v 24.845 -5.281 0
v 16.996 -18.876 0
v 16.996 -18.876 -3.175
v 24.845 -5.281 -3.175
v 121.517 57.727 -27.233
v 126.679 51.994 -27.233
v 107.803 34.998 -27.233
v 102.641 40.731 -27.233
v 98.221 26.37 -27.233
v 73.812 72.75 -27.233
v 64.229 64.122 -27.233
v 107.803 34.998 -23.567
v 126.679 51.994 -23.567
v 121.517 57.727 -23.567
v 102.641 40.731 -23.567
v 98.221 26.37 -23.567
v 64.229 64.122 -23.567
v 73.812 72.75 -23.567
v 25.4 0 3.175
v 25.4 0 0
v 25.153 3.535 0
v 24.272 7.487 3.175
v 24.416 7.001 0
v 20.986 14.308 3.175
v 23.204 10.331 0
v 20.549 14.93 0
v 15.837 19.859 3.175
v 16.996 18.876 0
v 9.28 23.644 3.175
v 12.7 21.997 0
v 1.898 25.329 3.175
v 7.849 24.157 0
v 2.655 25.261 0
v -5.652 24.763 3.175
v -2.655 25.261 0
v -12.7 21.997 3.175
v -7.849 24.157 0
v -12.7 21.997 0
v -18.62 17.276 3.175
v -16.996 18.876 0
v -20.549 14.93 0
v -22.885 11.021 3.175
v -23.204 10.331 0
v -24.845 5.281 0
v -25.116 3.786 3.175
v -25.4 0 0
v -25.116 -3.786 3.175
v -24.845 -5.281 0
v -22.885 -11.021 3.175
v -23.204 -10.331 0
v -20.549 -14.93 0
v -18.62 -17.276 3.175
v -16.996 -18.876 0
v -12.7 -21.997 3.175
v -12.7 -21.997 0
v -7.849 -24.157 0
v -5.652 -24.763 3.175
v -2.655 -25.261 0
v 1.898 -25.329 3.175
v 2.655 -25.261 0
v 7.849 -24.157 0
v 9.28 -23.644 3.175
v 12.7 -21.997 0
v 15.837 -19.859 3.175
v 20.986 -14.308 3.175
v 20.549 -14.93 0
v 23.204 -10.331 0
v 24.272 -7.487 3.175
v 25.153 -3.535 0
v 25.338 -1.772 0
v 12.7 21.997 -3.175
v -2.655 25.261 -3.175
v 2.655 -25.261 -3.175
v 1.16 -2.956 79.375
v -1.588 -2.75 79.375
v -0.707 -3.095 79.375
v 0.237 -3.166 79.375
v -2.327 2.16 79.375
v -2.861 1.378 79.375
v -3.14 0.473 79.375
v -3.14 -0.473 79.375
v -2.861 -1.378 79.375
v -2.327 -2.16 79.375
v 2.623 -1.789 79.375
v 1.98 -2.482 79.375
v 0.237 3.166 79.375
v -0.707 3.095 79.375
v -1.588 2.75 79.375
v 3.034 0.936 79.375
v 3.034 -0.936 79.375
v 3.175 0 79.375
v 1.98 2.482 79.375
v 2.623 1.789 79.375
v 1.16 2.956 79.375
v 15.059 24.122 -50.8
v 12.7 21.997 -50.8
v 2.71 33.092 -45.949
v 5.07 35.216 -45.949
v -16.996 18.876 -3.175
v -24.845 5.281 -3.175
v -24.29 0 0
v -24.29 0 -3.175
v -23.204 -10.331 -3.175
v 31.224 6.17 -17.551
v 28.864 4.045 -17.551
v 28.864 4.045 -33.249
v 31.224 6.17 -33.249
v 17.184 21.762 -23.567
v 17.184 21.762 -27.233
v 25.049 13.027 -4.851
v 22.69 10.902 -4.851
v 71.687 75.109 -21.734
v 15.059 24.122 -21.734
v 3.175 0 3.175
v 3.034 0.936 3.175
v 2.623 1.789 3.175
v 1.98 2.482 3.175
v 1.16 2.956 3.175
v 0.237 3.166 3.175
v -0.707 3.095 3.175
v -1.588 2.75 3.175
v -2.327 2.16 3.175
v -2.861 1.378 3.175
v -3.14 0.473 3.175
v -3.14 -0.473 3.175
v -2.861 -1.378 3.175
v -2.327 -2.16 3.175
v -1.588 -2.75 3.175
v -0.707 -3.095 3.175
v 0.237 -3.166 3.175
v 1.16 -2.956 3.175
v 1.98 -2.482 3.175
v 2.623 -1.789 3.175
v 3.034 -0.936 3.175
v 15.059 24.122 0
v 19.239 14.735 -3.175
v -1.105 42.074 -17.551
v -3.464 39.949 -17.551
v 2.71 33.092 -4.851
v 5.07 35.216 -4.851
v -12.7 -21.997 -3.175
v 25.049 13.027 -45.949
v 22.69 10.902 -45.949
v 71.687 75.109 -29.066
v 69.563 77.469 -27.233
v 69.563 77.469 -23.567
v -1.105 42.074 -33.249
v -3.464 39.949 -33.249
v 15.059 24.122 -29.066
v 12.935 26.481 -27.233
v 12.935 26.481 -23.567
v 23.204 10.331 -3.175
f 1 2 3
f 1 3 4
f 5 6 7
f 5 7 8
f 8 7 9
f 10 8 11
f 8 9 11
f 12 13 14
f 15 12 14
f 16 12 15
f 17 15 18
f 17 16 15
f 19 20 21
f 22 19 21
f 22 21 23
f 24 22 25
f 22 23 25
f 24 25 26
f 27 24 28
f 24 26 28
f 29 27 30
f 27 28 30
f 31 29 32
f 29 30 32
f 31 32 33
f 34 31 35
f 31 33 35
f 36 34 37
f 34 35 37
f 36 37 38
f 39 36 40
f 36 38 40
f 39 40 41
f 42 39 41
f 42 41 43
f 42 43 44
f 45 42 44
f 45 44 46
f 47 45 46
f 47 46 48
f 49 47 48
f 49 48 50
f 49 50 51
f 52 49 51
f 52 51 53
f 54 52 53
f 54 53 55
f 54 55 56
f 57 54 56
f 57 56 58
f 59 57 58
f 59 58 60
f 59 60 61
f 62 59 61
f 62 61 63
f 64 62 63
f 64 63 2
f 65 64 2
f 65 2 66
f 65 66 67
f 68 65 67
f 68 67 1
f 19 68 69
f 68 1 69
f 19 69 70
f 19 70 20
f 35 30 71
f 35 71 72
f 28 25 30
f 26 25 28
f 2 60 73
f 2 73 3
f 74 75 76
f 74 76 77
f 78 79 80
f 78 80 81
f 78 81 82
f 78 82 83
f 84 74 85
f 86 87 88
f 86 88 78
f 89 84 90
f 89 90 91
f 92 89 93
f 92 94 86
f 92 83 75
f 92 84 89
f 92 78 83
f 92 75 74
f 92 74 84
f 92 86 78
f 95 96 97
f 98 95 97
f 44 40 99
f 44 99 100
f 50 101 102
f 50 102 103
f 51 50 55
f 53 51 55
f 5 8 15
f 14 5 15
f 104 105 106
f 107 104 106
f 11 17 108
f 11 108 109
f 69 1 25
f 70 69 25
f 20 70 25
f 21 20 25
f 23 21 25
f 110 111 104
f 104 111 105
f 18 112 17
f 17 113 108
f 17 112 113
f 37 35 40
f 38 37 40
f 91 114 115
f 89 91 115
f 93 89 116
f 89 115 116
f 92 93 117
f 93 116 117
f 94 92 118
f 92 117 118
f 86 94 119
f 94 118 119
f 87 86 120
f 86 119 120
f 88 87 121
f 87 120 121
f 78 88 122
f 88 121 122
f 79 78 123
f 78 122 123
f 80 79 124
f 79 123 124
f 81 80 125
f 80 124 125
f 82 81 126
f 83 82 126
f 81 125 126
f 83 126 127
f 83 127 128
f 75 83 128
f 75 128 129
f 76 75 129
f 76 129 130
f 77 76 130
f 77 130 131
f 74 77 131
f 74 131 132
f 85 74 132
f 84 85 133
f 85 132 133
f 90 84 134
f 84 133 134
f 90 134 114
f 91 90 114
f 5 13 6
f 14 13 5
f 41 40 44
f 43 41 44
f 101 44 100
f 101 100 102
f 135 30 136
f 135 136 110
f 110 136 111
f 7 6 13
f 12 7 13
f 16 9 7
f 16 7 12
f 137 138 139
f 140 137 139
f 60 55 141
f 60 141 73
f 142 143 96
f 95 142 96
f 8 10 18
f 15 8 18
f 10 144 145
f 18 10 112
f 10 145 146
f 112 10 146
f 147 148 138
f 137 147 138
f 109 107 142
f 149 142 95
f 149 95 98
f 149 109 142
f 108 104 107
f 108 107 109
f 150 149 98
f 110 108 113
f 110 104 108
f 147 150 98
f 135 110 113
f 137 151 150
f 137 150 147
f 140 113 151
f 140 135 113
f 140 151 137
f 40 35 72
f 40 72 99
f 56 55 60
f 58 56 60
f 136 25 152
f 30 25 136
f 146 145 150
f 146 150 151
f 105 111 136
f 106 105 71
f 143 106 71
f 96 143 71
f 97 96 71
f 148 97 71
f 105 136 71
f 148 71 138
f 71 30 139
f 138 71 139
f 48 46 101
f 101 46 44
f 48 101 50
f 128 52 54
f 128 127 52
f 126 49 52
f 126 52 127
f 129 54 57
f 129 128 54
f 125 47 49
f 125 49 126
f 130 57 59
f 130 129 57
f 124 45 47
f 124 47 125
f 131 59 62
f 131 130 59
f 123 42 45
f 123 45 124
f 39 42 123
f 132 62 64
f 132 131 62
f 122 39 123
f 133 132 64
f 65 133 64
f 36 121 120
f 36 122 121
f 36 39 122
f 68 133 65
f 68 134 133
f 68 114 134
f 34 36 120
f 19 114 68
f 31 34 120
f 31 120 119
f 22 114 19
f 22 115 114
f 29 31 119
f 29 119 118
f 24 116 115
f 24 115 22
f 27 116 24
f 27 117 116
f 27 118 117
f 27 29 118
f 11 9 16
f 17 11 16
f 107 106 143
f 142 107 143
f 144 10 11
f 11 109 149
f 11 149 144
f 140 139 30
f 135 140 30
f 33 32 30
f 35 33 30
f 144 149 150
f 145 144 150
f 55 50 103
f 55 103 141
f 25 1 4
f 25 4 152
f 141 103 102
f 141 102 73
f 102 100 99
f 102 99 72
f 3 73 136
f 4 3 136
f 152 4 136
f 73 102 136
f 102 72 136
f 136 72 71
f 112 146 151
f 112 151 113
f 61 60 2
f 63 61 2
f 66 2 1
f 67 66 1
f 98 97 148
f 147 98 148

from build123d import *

# Parameters (mm, degrees)
F0_R      = 25.4
F1_DEPTH  = 3.175
F2_R      = 3.175
F3_DEPTH  = 76.2
F5_DEPTH  = 3.175
F7_DEPTH  = 3.175
F9_DEPTH  = 76.2
F10_W     = 12.8941143926
F10_H     = 3.6661742094
F11_DEPTH = 50.8
F12_W     = 7.7148651539
F12_H     = 3.6661742094
F13_DEPTH = 25.4


with BuildPart() as f1:
    # F0 (on Top) → F1 (new body)
    with BuildSketch(Plane.XY):
        Circle(F0_R)
    extrude(amount=F1_DEPTH)

    # F2 (on face) → F3 (join)
    with BuildSketch(Plane.XY.offset(3.175)):
        Circle(F2_R)
    extrude(amount=F3_DEPTH)

    # F4 (on Top) → F5 (join)
    with BuildSketch(Plane.XY):
        Polygon((-24.8449490586, 5.2809569468), (-24.2898981173, 0), (-23.2040546241, -10.3311107341), (-12.7, -21.9970452561), (2.655022967, -25.2608561424), (16.9959174015, -18.8758785671), (24.8449490586, -5.2809569468), (23.2040546241, 10.3311107341), (12.7, 21.9970452561), (-2.655022967, 25.2608561424), (-16.9959174015, 18.8758785671), align=None)
    extrude(amount=-F5_DEPTH)

    # F6 (on face) → F7 (join)
    with BuildSketch(Plane(origin=(17.9520273121, 16.1640779951, 0), x_dir=(-0.6691306064, 0.7431448255, 0), z_dir=(0.7431448255, 0.6691306064, 0))):
        Polygon((22.7787770654, -4.8509683429), (7.8490316571, 0), (-7.0807137511, -4.8509683429), (-16.3078038568, -17.5509683429), (-16.3078038568, -33.2490316571), (-7.0807137511, -45.9490316571), (7.8490316571, -50.8), (22.7787770654, -45.9490316571), (32.005867171, -33.2490316571), (32.005867171, -17.5509683429), align=None)
    extrude(amount=F7_DEPTH)

    # F8 (on face) → F9 (join)
    with BuildSketch(Plane(origin=(20.311512133, 18.2885676703, 0), x_dir=(-0.6691306064, 0.7431448255, 0), z_dir=(0.7431448255, 0.6691306064, 0))):
        Polygon((11.0240316571, -27.2330871047), (11.0240316571, -23.5669128953), (7.8490316571, -21.7338257906), (4.6740316571, -23.5669128953), (4.6740316571, -27.2330871047), (7.8490316571, -29.0661742094), align=None)
    extrude(amount=F9_DEPTH)

    # F10 (on face) → F11 (join)
    with BuildSketch(Plane(origin=(-3.1275376369, 3.4734824401, 0), x_dir=(0.7431448255, 0.6691306064, 0), z_dir=(0.6691306064, -0.7431448255, 0))):
        with Locations((97.0847783176, -25.4)):
            Rectangle(F10_W, F10_H)
    extrude(amount=F11_DEPTH)

    # F12 (on face) → F13 (join)
    with BuildSketch(Plane(origin=(76.9391478343, 69.2763198749, 0), x_dir=(-0.6691306064, 0.7431448255, 0), z_dir=(0.7431448255, 0.6691306064, 0))):
        with Locations((-42.2685357659, -25.4)):
            Rectangle(F12_W, F12_H)
    extrude(amount=F13_DEPTH)


solid = f1.part
